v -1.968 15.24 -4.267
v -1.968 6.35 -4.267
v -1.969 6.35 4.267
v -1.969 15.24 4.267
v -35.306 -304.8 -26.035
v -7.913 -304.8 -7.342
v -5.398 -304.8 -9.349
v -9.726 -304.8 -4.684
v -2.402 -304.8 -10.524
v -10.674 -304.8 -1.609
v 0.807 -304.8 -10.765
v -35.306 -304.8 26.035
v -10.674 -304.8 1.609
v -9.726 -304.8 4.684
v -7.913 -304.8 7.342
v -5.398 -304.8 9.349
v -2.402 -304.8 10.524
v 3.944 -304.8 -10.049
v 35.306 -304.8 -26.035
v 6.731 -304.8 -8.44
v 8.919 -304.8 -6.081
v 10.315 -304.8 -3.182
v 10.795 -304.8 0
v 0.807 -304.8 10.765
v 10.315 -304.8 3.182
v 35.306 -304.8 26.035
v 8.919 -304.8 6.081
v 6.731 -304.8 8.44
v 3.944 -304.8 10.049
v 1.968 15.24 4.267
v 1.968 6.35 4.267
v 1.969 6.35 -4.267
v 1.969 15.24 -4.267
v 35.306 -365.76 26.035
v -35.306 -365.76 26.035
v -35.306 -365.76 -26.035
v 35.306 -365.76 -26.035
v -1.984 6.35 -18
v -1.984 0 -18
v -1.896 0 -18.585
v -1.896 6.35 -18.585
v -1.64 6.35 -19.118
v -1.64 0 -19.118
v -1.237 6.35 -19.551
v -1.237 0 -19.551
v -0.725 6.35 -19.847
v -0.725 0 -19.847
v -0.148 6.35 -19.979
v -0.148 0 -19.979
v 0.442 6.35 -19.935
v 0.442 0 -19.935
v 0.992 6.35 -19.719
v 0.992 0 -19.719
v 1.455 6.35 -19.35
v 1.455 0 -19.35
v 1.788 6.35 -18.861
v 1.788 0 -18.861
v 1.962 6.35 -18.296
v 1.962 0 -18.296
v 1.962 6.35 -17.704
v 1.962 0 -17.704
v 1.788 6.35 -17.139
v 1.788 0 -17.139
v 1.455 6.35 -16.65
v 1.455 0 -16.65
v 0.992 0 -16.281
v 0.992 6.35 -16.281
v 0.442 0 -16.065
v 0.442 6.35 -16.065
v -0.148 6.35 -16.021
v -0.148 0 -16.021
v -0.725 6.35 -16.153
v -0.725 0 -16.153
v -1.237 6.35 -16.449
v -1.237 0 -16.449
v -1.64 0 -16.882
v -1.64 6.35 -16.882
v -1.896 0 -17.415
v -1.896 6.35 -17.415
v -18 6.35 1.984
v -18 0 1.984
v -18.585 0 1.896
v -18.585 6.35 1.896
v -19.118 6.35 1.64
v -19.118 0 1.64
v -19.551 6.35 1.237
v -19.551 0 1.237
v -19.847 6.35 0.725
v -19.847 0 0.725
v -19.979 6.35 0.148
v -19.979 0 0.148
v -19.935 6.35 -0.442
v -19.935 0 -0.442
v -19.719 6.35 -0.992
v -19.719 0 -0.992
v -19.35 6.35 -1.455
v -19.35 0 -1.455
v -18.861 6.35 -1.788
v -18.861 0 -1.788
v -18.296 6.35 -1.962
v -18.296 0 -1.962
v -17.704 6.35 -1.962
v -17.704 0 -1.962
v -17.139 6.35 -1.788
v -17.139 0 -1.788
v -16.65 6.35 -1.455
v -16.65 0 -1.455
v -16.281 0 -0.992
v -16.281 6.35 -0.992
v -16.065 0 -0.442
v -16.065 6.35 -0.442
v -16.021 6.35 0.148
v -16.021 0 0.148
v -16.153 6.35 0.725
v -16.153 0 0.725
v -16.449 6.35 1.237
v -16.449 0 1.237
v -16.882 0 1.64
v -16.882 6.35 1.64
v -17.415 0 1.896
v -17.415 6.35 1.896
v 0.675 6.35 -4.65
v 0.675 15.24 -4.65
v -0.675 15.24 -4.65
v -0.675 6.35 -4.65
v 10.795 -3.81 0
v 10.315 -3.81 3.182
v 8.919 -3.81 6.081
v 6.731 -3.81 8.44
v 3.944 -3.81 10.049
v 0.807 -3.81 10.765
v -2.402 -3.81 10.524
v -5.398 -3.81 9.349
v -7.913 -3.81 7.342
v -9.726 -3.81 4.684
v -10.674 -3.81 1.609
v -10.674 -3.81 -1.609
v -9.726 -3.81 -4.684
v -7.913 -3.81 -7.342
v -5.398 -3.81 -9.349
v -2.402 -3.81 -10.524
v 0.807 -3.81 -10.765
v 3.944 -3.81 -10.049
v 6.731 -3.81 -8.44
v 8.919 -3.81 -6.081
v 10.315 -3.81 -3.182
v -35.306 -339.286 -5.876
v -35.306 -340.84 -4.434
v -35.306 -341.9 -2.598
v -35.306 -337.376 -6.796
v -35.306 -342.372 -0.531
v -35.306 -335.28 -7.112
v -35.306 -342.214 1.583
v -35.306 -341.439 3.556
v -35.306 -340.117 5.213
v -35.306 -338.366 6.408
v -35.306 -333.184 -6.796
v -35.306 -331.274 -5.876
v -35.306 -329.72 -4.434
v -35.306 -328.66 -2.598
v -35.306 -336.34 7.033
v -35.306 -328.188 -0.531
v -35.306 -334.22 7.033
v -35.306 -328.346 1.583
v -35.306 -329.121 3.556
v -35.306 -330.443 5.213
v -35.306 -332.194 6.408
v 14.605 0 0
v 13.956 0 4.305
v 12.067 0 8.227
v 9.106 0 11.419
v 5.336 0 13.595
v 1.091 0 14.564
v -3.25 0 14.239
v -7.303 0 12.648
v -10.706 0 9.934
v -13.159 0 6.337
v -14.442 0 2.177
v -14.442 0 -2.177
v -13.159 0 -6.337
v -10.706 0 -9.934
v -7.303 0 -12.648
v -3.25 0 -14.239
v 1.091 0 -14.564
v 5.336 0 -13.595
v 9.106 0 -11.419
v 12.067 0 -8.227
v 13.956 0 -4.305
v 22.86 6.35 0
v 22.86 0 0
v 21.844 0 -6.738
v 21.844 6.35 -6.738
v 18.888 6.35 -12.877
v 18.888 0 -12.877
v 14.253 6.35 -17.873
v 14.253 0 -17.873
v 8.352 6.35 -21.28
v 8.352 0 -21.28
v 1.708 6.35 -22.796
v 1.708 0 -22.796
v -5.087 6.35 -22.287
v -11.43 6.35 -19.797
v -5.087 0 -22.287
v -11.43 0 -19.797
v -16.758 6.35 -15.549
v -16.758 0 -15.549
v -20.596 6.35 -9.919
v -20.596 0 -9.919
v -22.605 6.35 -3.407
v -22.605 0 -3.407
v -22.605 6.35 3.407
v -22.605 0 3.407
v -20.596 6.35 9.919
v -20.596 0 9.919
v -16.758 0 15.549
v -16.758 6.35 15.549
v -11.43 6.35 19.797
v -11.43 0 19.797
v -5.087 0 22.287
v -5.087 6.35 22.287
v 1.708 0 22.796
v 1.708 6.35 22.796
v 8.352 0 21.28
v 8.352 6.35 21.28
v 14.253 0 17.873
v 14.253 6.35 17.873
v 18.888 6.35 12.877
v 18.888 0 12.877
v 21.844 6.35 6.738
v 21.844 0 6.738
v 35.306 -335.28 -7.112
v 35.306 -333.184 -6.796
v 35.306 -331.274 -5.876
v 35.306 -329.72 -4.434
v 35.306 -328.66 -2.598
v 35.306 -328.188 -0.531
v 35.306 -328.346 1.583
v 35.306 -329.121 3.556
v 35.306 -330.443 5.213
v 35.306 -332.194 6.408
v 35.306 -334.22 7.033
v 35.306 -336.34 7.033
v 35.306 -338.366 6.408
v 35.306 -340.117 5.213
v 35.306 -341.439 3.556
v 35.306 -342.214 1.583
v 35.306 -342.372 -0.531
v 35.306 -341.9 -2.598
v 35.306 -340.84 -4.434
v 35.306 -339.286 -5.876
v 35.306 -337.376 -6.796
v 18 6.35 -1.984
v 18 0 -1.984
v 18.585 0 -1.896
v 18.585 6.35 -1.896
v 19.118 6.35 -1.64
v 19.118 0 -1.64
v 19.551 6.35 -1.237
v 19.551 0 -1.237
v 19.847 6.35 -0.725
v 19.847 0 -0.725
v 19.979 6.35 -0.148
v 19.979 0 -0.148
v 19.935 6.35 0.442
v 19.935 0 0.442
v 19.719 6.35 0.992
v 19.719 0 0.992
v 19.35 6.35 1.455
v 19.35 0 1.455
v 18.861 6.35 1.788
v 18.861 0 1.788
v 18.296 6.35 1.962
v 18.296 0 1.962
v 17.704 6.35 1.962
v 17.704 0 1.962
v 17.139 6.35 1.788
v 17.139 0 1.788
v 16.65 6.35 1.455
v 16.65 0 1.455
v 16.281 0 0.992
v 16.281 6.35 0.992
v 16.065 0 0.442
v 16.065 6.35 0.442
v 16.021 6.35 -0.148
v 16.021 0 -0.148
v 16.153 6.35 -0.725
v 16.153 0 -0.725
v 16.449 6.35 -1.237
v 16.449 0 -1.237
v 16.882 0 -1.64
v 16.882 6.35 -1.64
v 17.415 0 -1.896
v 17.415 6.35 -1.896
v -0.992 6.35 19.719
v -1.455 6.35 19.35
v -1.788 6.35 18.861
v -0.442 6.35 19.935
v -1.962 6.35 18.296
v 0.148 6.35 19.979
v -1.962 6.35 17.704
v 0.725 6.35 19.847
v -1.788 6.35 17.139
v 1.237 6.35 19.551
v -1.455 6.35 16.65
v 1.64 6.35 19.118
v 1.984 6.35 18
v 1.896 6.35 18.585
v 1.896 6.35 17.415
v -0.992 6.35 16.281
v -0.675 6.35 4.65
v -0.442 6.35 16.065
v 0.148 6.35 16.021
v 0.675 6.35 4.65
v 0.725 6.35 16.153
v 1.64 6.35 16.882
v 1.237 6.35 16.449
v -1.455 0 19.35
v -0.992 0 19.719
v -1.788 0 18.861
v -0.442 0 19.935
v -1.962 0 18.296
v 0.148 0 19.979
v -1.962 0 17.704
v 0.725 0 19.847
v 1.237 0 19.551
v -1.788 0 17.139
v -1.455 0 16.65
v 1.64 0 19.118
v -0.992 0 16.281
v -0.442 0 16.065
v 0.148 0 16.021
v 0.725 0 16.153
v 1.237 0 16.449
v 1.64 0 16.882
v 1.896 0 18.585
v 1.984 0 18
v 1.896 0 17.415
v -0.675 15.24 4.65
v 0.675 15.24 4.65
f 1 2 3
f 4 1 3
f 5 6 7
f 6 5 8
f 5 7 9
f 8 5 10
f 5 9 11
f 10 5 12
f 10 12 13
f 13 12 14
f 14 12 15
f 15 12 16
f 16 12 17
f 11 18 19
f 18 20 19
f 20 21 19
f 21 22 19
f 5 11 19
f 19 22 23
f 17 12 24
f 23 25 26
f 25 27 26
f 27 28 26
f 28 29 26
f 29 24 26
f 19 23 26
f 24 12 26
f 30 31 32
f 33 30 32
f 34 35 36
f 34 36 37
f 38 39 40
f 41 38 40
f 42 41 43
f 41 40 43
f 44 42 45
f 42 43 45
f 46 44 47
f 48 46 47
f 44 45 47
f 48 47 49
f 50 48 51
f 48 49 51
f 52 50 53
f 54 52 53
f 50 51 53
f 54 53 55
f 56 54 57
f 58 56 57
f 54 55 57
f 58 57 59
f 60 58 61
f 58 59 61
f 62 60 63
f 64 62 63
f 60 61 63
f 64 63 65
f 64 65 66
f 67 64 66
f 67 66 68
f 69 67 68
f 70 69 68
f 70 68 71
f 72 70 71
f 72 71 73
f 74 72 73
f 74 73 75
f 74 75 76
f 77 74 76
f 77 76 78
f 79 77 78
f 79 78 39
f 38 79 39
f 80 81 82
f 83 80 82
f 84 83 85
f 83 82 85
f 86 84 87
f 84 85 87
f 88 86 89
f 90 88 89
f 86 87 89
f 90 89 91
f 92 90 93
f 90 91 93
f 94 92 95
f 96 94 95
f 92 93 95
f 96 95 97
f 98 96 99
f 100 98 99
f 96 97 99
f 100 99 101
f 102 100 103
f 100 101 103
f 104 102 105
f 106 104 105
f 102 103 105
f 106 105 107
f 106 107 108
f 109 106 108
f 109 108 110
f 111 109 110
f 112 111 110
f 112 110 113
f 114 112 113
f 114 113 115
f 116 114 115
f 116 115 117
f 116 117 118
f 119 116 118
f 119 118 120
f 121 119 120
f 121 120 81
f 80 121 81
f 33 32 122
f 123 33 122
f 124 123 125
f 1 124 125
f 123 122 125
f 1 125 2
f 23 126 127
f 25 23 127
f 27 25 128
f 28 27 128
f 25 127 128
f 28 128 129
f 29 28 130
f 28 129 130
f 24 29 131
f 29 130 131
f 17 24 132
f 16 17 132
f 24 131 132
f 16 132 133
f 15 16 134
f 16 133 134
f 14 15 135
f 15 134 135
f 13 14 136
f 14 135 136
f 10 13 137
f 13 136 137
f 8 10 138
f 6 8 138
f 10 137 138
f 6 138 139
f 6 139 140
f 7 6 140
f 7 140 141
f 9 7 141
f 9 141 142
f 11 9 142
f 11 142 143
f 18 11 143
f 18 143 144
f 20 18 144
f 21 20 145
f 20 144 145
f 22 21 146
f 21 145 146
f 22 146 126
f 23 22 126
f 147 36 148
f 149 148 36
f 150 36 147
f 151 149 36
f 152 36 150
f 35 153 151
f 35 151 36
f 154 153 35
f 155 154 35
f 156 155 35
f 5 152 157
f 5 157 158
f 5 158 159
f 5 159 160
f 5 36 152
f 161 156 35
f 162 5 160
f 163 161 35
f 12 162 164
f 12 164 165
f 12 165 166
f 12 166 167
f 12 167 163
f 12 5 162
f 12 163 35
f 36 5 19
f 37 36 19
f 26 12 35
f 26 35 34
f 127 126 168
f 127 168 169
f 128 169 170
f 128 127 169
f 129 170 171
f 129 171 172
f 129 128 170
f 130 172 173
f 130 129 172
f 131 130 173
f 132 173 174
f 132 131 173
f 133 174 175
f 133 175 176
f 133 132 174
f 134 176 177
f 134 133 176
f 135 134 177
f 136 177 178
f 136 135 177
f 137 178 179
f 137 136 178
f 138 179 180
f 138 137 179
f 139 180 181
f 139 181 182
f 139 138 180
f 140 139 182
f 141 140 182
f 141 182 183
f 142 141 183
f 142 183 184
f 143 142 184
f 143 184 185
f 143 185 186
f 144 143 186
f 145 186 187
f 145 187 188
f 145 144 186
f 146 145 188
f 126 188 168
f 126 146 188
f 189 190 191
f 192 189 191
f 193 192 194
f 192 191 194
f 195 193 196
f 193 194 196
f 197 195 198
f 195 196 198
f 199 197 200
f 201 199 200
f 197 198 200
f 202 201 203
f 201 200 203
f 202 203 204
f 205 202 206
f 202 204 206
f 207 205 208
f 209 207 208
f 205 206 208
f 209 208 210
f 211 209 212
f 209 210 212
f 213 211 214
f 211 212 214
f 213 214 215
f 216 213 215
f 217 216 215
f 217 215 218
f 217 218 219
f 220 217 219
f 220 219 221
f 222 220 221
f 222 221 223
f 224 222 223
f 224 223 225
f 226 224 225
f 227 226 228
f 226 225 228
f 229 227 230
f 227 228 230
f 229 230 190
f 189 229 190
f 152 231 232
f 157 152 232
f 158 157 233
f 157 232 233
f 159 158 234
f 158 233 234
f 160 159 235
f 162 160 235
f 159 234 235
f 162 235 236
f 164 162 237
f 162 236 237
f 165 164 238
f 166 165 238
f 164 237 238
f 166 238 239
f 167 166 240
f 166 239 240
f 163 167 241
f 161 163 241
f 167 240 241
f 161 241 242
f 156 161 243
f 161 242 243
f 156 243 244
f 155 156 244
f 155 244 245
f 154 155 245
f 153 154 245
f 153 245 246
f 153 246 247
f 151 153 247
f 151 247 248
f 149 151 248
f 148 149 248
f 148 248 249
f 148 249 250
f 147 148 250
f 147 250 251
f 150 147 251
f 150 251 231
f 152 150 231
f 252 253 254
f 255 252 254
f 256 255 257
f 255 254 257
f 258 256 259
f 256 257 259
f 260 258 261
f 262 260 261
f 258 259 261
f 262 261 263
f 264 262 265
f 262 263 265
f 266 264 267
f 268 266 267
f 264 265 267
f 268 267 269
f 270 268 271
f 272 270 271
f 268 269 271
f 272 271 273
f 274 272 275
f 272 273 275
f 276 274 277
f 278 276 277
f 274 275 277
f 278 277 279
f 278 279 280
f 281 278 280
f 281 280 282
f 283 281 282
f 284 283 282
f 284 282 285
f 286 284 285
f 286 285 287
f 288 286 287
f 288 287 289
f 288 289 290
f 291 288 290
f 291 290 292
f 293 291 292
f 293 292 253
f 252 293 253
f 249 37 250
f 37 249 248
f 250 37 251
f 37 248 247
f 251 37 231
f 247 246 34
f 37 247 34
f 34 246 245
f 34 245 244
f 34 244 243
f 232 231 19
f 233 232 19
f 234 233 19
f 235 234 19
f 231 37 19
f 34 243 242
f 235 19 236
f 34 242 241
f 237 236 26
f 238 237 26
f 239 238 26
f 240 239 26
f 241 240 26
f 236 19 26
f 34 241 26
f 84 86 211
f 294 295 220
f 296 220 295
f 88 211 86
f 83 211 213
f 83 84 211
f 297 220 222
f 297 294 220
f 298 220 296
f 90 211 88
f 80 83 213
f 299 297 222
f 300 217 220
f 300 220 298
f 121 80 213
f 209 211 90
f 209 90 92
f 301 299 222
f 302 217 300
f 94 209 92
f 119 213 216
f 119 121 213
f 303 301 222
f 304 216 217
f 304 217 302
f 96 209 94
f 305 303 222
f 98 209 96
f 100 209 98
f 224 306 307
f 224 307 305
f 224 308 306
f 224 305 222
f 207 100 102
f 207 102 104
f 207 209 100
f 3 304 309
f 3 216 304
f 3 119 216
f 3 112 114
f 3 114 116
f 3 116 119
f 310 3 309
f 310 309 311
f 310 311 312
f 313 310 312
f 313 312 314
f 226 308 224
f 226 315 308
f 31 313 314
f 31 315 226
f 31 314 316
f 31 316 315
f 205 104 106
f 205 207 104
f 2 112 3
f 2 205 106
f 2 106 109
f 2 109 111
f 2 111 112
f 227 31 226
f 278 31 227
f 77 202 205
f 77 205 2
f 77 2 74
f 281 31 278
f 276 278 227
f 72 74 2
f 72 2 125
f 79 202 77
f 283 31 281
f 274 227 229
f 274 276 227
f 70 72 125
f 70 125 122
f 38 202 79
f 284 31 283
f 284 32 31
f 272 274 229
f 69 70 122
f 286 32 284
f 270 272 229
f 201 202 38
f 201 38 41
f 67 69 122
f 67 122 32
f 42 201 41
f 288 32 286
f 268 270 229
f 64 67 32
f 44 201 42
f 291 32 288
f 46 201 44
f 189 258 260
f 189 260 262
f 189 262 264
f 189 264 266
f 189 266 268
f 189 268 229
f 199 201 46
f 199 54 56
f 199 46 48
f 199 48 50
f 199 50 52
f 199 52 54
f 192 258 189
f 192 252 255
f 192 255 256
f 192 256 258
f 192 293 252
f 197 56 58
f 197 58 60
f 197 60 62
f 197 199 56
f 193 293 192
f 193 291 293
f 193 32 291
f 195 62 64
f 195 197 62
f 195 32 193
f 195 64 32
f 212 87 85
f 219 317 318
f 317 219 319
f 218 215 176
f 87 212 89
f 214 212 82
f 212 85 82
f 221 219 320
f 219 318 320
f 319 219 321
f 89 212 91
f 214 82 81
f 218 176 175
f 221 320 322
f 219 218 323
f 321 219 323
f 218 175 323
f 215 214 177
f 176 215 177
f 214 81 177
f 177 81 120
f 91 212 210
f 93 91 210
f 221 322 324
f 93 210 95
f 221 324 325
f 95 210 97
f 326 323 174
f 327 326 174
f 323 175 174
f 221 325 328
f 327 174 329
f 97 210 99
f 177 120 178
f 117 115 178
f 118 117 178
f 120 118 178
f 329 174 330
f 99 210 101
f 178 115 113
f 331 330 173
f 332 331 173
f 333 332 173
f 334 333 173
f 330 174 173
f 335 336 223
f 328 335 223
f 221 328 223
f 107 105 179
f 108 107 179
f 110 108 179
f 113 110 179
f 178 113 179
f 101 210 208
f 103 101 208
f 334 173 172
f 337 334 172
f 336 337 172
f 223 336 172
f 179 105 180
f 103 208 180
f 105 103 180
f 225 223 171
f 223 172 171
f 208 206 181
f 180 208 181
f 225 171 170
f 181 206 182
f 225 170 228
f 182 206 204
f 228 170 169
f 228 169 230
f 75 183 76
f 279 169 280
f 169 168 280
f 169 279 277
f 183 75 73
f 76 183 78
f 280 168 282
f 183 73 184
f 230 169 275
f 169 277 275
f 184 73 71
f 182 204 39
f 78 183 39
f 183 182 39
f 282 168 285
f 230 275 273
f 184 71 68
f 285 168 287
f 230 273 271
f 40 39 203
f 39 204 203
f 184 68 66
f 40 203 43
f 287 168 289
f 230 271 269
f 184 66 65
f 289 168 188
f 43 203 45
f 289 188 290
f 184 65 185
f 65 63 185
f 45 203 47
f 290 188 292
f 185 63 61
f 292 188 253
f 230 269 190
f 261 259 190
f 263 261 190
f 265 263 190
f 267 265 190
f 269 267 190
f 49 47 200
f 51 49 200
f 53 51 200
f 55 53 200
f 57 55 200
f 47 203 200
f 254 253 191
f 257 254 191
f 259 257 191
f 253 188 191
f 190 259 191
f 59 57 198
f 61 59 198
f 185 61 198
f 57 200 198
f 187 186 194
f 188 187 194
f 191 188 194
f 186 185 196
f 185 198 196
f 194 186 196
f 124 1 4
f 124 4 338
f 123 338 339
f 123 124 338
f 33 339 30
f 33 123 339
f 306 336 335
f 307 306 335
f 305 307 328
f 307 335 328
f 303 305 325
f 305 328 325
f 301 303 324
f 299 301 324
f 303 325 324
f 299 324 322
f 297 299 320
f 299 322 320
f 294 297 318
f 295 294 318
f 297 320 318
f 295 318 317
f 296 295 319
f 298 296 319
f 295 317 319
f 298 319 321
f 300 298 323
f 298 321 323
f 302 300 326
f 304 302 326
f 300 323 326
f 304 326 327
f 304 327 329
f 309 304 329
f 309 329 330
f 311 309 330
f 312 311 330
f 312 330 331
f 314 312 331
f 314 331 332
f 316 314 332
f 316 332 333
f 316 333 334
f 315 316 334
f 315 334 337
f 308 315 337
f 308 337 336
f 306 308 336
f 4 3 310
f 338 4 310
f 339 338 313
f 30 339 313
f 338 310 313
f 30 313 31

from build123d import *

# Parameters (mm, degrees)
SKETCH1_R                           = 22.86
BOSS_EXTRUDE1_DEPTH                 = 6.35
BOSS_EXTRUDE2_DEPTH                 = 8.89
SKETCH3_R                           = 10.795
BOSS_EXTRUDE3_DEPTH                 = 304.8
CHAMFER1_SIZE                       = 3.81
F_5_32_0_15625_DIAMETER_HOLE1_D     = 3.96875
F_5_32_0_15625_DIAMETER_HOLE1_DEPTH = 6.351
CIRPATTERN1_COUNT                   = 4
SKETCH7_W                           = 70.612
SKETCH7_H                           = 52.07
BOSS_EXTRUDE4_DEPTH                 = 60.96
SKETCH8_R                           = 7.112
CUT_EXTRUDE1_DEPTH                  = 71.612


with BuildPart() as part:
    # Sketch1 → Boss-Extrude1 (new body)
    with BuildSketch(Plane(origin=(0, 0, 0), x_dir=(1, 0, 0), z_dir=(0, 1, 0))):
        Circle(SKETCH1_R)
    extrude(amount=BOSS_EXTRUDE1_DEPTH)

    # Sketch2 → Boss-Extrude2 (add)
    with BuildSketch(Plane(origin=(0, 6.35, 0), x_dir=(1, 0, 0), z_dir=(0, 1, 0))):
        with BuildLine():
            Line((1.9685, -4.266803107), (1.9685, 4.266803107))
            ThreePointArc((1.9685, 4.266803107), (0, 4.699), (-1.9685, 4.266803107))
            Line((-1.9685, 4.266803107), (-1.9685, -4.266803107))
            ThreePointArc((-1.9685, -4.266803107), (0, -4.699), (1.9685, -4.266803107))
        make_face()
    extrude(amount=BOSS_EXTRUDE2_DEPTH)

    # Sketch3 → Boss-Extrude3 (add)
    with BuildSketch(Plane.XZ):
        Circle(SKETCH3_R)
    extrude(amount=BOSS_EXTRUDE3_DEPTH)

    # Chamfer1
    chamfer1_edges = [part.edges().sort_by_distance(p)[0] for p in [
        (-10.795, 0, 0),
    ]]
    chamfer(chamfer1_edges, length=CHAMFER1_SIZE)

    # 5/32 (0.15625) Diameter Hole1
    with Locations(Plane(origin=(0, 6.35, 0), x_dir=(1, 0, 0), z_dir=(0, 1, 0))):
        with Locations((0, 18)):
            f_5_32_0_15625_diameter_hole1 = Hole(F_5_32_0_15625_DIAMETER_HOLE1_D / 2, depth=F_5_32_0_15625_DIAMETER_HOLE1_DEPTH)

    # CirPattern1: 5/32 (0.15625) Diameter Hole1 ×4 about axis
    cirpattern1_axis = Axis((0, 0, 0), (0, 1, 0))
    for i in range(1, CIRPATTERN1_COUNT):
        add(f_5_32_0_15625_diameter_hole1.rotate(cirpattern1_axis, i * 360 / CIRPATTERN1_COUNT), mode=Mode.SUBTRACT)

    # Sketch7 → Boss-Extrude4 (add)
    with BuildSketch(Plane.XZ.offset(304.8)):
        Rectangle(SKETCH7_W, SKETCH7_H)
    extrude(amount=BOSS_EXTRUDE4_DEPTH)

    # Sketch8 → Cut-Extrude1 (cut, through all)
    with BuildSketch(Plane(origin=(35.306, 0, 0), x_dir=(0, 0, -1), z_dir=(1, 0, 0))):
        with Locations((0, -335.28)):
            Circle(SKETCH8_R)
    extrude(amount=-CUT_EXTRUDE1_DEPTH, mode=Mode.SUBTRACT)


solid = part.part
